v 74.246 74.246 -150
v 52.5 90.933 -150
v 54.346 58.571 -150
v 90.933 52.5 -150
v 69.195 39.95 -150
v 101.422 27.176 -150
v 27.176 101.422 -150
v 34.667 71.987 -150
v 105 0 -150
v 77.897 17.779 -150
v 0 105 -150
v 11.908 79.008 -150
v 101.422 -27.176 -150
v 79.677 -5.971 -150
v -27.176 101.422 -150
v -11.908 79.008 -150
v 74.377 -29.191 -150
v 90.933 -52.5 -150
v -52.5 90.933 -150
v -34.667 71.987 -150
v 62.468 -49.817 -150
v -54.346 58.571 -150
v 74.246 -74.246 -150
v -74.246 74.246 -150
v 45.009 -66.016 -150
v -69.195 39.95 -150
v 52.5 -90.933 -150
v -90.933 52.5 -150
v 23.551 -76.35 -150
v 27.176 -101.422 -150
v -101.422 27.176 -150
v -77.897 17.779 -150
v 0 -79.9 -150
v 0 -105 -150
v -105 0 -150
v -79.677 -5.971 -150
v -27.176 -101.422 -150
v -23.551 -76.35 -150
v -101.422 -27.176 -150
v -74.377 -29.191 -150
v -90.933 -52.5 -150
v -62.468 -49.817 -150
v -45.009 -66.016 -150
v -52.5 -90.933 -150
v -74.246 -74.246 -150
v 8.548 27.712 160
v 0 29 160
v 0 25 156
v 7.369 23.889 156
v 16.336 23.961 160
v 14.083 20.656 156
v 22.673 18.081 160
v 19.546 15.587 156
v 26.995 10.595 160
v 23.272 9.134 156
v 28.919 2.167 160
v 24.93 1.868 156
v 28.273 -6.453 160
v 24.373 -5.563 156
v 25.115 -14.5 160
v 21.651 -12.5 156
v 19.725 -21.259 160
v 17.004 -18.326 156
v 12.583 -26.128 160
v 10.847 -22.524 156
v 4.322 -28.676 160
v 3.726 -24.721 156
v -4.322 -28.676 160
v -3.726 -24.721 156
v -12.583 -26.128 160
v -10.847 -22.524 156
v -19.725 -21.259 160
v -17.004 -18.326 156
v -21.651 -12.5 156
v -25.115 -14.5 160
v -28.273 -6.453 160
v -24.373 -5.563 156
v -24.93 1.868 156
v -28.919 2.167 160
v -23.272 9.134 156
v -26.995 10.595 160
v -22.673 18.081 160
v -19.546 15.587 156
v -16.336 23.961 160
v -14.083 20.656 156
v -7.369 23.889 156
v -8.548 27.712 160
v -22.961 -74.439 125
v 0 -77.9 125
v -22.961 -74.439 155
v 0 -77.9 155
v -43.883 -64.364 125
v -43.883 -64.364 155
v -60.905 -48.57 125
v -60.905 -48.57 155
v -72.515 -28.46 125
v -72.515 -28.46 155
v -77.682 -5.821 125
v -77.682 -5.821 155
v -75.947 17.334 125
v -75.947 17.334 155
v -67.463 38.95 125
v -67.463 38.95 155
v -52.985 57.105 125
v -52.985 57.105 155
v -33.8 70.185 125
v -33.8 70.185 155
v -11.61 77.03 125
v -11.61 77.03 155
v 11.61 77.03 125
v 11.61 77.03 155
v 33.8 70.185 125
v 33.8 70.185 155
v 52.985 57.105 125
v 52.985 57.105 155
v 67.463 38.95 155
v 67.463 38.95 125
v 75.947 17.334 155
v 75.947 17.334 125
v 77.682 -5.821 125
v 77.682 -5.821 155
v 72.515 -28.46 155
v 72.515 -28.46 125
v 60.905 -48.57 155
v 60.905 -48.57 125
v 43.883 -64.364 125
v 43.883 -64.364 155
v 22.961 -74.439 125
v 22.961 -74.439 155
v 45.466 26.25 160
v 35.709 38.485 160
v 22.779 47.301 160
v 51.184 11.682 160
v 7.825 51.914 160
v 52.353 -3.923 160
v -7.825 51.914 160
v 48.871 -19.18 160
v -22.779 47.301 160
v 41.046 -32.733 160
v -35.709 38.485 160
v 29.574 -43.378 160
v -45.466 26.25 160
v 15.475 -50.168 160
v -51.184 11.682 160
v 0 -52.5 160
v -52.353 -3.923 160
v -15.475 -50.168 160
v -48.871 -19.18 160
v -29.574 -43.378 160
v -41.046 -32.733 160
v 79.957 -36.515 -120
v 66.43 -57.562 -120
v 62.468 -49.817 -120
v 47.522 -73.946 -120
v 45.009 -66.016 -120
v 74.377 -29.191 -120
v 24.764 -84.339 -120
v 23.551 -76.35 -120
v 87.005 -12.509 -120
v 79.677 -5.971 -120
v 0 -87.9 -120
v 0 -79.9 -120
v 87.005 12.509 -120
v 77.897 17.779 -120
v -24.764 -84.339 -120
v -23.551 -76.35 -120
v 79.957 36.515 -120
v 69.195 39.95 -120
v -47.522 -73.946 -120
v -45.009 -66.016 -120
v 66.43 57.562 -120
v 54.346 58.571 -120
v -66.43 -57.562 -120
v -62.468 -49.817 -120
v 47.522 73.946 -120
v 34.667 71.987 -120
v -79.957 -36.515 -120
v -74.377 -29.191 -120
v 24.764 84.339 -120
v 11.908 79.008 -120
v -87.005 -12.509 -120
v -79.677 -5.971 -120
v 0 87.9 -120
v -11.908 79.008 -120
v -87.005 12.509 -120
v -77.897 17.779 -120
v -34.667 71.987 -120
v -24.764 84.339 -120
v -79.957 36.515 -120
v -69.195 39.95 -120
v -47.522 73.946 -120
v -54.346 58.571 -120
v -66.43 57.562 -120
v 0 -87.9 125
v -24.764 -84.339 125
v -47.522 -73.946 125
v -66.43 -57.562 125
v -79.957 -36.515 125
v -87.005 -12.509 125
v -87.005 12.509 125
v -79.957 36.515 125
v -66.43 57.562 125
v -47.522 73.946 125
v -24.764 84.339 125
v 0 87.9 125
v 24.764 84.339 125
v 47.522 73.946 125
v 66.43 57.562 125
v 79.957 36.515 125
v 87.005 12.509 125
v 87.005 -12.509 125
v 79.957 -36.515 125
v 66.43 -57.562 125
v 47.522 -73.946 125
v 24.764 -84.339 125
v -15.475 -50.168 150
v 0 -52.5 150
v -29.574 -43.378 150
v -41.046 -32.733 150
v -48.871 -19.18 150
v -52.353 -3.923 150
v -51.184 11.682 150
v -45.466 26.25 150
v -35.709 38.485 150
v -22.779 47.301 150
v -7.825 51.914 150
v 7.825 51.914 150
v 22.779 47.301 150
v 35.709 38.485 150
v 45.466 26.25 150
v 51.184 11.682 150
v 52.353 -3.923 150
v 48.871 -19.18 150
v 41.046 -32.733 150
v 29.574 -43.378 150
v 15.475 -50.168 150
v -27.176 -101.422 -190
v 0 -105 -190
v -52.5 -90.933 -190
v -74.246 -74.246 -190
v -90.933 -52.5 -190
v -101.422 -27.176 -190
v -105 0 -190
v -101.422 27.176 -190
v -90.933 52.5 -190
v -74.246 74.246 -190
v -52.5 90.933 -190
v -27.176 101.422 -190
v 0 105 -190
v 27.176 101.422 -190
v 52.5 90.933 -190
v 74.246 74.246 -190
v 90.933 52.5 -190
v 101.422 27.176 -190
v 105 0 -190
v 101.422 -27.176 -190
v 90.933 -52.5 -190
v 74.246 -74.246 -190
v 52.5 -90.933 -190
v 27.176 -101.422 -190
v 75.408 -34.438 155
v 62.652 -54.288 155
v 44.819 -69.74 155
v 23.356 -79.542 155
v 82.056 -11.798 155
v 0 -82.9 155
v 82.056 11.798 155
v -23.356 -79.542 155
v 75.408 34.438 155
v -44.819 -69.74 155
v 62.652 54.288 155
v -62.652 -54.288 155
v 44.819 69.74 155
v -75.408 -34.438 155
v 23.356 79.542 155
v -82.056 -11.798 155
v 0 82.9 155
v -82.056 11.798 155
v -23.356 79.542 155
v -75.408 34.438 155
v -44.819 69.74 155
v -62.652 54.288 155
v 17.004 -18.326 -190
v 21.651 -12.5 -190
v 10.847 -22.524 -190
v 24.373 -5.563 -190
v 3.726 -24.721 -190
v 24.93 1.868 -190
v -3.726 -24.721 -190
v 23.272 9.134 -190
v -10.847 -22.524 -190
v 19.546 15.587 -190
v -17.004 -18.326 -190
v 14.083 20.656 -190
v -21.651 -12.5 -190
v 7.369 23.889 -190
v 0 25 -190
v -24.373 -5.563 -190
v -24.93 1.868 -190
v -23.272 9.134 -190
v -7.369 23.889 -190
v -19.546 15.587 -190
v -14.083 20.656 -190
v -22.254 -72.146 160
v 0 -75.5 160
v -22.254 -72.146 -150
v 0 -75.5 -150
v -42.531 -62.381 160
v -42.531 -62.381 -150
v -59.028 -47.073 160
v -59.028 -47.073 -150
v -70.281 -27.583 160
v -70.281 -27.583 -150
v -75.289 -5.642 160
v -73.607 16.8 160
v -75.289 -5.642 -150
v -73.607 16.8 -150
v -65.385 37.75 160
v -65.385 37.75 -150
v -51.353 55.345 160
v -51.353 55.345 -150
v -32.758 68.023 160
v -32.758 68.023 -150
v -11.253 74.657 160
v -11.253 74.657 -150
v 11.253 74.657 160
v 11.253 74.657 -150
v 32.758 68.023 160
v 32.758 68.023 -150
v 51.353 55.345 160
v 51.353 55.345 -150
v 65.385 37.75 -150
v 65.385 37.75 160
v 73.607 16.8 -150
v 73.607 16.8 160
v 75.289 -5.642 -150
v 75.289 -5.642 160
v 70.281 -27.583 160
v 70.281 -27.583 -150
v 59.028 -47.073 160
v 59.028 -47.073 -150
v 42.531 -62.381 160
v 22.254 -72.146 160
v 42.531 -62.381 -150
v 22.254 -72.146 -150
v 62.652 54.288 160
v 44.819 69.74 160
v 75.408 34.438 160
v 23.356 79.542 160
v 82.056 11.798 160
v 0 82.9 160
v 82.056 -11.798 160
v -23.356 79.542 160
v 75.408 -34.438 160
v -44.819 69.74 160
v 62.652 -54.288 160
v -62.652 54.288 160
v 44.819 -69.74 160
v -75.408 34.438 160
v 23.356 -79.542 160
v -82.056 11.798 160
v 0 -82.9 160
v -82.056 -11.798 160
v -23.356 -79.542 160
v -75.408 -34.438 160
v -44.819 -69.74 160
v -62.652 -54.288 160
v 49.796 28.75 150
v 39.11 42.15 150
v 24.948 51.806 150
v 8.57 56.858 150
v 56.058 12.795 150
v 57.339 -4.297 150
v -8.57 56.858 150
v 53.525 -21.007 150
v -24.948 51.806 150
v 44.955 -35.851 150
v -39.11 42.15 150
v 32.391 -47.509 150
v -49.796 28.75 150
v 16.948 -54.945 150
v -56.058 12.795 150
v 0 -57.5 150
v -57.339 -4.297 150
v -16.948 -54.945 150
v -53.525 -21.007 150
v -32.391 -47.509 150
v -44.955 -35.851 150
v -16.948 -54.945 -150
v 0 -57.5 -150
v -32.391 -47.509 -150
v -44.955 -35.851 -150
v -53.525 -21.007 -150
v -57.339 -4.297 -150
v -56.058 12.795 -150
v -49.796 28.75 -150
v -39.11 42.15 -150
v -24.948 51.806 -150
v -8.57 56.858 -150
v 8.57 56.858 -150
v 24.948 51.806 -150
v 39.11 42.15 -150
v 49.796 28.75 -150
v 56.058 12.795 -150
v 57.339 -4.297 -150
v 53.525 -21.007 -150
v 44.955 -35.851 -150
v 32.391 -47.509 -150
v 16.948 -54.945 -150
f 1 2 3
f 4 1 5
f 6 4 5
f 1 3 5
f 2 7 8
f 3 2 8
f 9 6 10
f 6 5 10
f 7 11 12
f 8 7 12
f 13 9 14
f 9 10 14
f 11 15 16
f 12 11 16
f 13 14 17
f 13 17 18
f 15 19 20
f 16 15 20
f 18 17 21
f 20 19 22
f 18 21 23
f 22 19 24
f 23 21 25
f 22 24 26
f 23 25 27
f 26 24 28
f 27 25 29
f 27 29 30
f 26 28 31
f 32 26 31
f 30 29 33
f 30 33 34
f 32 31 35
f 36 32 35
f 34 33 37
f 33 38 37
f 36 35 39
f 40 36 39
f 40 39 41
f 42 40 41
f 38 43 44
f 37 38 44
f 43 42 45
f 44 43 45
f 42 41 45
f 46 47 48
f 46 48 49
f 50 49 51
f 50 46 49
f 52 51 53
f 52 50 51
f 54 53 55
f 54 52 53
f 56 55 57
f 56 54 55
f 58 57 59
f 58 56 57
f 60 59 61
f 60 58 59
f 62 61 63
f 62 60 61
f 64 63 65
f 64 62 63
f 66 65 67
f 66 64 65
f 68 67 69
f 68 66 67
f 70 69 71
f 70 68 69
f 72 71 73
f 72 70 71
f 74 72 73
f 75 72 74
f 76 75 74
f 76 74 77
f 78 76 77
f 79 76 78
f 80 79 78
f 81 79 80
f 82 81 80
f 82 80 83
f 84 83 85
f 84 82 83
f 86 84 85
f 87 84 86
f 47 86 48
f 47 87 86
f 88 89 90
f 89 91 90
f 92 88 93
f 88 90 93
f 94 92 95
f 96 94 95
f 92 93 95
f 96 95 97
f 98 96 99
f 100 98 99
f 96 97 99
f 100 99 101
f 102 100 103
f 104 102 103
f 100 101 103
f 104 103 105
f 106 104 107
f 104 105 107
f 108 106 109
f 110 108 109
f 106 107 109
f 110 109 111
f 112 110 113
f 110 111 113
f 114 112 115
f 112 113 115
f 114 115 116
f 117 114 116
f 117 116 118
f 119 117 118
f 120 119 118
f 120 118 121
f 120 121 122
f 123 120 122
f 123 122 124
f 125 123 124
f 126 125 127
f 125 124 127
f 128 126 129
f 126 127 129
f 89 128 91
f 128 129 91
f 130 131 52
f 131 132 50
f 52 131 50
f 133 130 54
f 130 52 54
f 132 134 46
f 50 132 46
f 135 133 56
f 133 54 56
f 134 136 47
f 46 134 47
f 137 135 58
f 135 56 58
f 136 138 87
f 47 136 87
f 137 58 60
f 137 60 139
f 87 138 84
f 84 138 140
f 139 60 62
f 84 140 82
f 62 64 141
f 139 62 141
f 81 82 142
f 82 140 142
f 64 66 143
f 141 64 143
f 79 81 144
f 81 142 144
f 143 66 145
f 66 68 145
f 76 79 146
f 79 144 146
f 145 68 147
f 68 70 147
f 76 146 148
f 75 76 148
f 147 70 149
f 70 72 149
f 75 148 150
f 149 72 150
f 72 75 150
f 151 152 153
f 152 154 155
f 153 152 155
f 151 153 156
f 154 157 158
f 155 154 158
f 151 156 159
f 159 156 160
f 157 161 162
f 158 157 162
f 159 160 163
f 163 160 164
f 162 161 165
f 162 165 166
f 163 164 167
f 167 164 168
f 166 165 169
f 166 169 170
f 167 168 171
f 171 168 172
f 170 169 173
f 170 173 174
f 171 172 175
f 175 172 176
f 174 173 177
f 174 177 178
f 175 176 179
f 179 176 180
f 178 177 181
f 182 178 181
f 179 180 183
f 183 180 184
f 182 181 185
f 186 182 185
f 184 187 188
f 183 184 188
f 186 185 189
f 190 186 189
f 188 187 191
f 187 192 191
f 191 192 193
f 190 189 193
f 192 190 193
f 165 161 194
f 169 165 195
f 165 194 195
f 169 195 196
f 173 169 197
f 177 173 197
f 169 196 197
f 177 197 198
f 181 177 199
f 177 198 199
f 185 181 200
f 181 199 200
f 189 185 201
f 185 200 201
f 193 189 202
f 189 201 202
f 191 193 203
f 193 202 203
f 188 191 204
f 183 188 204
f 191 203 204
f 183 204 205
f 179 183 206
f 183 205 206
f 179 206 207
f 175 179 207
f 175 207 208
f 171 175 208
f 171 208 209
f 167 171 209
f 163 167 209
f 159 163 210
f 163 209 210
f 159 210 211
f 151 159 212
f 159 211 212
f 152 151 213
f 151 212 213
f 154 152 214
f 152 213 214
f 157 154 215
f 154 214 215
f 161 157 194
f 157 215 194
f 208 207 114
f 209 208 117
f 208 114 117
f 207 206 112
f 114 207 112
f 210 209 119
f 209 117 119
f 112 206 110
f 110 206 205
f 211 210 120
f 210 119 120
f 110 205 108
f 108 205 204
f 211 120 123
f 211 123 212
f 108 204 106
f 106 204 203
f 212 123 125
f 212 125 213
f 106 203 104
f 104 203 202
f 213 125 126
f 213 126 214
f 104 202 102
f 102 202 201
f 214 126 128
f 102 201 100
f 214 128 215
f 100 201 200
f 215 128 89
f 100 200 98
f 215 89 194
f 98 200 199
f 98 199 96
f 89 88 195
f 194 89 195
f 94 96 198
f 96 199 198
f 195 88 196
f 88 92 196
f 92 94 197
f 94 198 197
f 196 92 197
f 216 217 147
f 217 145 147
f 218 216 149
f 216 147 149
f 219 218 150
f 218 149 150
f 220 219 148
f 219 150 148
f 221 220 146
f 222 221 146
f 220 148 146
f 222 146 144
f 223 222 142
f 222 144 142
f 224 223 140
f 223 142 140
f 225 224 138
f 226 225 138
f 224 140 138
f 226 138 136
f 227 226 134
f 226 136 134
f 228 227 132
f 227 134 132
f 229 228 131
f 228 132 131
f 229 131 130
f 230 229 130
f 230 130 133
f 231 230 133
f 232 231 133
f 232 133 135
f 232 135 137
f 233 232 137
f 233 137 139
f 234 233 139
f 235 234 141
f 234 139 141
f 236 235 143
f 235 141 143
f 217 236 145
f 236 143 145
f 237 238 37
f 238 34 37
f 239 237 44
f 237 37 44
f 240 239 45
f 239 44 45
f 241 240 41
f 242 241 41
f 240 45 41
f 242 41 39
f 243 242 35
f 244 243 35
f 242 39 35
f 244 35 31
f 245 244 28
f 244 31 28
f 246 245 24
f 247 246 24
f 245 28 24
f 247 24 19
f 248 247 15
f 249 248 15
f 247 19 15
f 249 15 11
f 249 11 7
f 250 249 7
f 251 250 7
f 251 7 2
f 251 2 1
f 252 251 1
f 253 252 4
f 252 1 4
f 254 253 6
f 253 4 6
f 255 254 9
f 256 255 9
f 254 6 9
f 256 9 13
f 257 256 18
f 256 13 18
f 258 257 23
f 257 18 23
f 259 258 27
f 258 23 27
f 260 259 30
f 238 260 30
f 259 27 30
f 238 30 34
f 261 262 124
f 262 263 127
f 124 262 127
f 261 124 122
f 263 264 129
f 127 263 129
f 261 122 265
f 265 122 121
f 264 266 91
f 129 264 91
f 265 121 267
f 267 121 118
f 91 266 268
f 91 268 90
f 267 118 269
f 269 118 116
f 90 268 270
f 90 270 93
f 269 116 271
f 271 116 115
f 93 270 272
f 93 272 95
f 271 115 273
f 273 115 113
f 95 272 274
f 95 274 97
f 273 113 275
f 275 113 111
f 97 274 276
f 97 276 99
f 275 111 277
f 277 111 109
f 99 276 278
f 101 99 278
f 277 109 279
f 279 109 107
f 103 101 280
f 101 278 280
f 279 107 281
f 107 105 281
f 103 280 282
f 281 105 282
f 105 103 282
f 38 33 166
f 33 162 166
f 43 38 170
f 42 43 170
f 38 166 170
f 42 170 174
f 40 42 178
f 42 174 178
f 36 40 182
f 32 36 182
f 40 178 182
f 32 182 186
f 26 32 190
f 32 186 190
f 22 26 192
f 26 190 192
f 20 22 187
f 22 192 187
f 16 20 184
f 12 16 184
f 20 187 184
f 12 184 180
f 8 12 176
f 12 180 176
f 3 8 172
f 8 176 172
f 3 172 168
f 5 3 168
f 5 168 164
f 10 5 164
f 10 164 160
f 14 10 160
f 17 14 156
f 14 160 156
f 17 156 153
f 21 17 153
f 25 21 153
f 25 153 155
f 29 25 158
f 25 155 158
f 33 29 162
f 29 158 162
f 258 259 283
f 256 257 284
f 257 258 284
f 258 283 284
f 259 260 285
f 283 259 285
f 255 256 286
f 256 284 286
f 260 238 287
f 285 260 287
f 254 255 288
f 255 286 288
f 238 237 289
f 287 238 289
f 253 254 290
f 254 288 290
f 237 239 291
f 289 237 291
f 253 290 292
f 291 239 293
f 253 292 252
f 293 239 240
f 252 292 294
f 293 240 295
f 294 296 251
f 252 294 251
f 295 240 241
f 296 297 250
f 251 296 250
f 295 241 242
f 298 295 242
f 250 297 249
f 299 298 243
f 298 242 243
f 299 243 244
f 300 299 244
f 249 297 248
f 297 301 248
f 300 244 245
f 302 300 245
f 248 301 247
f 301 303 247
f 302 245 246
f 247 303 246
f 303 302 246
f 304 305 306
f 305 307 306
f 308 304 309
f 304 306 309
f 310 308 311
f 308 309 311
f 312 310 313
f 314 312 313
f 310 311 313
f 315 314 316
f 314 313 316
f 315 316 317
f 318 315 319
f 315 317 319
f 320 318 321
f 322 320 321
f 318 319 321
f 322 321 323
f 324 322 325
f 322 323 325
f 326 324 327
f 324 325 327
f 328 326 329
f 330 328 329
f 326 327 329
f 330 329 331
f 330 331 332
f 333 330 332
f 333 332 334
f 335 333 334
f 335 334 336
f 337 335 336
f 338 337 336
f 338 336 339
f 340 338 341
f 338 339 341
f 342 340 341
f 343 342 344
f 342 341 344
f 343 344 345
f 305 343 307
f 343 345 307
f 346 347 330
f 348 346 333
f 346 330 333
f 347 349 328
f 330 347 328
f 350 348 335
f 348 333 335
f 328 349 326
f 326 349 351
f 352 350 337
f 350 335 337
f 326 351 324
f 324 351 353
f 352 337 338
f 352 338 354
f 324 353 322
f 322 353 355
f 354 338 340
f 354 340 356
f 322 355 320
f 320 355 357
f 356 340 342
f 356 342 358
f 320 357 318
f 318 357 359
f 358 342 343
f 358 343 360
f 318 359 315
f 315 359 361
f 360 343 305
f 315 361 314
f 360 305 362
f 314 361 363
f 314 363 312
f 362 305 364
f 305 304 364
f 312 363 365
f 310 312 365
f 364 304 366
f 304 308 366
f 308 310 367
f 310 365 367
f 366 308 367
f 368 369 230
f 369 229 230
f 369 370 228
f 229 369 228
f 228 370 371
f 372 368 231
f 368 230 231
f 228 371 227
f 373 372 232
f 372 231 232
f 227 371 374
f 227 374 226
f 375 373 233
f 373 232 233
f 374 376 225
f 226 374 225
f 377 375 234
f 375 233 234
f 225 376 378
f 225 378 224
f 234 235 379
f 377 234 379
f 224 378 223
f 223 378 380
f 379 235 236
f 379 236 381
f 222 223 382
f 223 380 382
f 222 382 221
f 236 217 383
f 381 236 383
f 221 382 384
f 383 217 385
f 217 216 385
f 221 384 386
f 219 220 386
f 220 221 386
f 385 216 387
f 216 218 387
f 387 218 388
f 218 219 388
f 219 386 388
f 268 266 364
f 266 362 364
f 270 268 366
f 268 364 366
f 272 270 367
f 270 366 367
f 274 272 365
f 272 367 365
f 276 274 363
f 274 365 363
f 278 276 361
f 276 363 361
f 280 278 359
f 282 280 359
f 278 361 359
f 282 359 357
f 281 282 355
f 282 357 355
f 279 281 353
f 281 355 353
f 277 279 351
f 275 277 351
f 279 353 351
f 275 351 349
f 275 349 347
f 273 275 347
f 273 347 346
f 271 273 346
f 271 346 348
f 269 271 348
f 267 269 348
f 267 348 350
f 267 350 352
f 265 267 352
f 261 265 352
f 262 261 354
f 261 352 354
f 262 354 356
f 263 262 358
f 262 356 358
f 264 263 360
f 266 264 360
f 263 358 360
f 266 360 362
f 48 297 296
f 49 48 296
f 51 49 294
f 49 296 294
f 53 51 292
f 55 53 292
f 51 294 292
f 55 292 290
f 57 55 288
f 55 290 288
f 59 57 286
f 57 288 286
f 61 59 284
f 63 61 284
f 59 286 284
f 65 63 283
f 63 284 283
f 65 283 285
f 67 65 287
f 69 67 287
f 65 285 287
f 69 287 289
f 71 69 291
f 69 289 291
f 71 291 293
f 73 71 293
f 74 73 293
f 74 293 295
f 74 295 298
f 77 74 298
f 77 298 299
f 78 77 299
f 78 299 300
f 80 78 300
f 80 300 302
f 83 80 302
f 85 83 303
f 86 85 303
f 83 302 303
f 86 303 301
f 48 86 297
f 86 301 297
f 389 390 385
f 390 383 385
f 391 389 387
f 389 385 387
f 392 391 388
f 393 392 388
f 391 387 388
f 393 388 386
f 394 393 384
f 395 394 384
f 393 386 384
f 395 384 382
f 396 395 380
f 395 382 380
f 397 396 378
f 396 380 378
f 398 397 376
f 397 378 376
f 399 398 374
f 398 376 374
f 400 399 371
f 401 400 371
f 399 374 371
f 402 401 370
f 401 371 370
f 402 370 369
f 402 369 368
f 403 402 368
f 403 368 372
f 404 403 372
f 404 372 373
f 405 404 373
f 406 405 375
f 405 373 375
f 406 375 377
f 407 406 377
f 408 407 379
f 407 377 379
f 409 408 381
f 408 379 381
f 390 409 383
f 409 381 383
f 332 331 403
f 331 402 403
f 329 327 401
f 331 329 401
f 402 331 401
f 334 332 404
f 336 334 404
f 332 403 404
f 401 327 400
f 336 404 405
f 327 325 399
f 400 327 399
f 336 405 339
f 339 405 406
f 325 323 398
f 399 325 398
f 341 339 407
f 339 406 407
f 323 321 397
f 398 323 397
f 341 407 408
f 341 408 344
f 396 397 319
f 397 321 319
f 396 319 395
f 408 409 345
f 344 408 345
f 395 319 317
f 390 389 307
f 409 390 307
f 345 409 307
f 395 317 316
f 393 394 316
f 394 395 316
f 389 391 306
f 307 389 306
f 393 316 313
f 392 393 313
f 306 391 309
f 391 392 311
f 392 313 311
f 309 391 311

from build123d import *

# Parameters (mm, degrees)
SKETCH4_R          = 25
CUT_EXTRUDE1_DEPTH = 350
CHAMFER1_SIZE      = 4


with BuildPart() as part:
    # Sketch2 → Revolve1 (revolve)
    with BuildSketch(Plane(origin=(0, 0, 0), x_dir=(0, 0, -1), z_dir=(1, 0, 0)), mode=Mode.PRIVATE) as revolve1_sk:
        Polygon((190, 0), (190, 105), (150, 105), (150, 79.9), (120, 79.9), (120, 87.9), (-125, 87.9), (-125, 77.9), (-155, 77.9), (-155, 82.9), (-160, 82.9), (-160, 75.5), (150, 75.5), (150, 57.5), (-150, 57.5), (-150, 52.5), (-160, 52.5), (-160, 0), align=None)
    revolve(revolve1_sk.sketch.rotate(Axis((0, 0, 160), (0, 0, -1)), 180), axis=Axis((0, 0, 160), (0, 0, -1)))

    # Sketch4 → Cut-Extrude1 (cut)
    with BuildSketch(Plane(origin=(0, 0, -190), x_dir=(-1, 0, 0), z_dir=(0, 0, -1))):
        with Locations(Location((0, 0, 0), (0, 0, 90))):
            Circle(SKETCH4_R)
    extrude(amount=-CUT_EXTRUDE1_DEPTH, mode=Mode.SUBTRACT)

    # Chamfer1
    chamfer1_edges = [part.edges().sort_by_distance(p)[0] for p in [
        (0, -25, 160),
    ]]
    chamfer(chamfer1_edges, length=CHAMFER1_SIZE)


solid = part.part
